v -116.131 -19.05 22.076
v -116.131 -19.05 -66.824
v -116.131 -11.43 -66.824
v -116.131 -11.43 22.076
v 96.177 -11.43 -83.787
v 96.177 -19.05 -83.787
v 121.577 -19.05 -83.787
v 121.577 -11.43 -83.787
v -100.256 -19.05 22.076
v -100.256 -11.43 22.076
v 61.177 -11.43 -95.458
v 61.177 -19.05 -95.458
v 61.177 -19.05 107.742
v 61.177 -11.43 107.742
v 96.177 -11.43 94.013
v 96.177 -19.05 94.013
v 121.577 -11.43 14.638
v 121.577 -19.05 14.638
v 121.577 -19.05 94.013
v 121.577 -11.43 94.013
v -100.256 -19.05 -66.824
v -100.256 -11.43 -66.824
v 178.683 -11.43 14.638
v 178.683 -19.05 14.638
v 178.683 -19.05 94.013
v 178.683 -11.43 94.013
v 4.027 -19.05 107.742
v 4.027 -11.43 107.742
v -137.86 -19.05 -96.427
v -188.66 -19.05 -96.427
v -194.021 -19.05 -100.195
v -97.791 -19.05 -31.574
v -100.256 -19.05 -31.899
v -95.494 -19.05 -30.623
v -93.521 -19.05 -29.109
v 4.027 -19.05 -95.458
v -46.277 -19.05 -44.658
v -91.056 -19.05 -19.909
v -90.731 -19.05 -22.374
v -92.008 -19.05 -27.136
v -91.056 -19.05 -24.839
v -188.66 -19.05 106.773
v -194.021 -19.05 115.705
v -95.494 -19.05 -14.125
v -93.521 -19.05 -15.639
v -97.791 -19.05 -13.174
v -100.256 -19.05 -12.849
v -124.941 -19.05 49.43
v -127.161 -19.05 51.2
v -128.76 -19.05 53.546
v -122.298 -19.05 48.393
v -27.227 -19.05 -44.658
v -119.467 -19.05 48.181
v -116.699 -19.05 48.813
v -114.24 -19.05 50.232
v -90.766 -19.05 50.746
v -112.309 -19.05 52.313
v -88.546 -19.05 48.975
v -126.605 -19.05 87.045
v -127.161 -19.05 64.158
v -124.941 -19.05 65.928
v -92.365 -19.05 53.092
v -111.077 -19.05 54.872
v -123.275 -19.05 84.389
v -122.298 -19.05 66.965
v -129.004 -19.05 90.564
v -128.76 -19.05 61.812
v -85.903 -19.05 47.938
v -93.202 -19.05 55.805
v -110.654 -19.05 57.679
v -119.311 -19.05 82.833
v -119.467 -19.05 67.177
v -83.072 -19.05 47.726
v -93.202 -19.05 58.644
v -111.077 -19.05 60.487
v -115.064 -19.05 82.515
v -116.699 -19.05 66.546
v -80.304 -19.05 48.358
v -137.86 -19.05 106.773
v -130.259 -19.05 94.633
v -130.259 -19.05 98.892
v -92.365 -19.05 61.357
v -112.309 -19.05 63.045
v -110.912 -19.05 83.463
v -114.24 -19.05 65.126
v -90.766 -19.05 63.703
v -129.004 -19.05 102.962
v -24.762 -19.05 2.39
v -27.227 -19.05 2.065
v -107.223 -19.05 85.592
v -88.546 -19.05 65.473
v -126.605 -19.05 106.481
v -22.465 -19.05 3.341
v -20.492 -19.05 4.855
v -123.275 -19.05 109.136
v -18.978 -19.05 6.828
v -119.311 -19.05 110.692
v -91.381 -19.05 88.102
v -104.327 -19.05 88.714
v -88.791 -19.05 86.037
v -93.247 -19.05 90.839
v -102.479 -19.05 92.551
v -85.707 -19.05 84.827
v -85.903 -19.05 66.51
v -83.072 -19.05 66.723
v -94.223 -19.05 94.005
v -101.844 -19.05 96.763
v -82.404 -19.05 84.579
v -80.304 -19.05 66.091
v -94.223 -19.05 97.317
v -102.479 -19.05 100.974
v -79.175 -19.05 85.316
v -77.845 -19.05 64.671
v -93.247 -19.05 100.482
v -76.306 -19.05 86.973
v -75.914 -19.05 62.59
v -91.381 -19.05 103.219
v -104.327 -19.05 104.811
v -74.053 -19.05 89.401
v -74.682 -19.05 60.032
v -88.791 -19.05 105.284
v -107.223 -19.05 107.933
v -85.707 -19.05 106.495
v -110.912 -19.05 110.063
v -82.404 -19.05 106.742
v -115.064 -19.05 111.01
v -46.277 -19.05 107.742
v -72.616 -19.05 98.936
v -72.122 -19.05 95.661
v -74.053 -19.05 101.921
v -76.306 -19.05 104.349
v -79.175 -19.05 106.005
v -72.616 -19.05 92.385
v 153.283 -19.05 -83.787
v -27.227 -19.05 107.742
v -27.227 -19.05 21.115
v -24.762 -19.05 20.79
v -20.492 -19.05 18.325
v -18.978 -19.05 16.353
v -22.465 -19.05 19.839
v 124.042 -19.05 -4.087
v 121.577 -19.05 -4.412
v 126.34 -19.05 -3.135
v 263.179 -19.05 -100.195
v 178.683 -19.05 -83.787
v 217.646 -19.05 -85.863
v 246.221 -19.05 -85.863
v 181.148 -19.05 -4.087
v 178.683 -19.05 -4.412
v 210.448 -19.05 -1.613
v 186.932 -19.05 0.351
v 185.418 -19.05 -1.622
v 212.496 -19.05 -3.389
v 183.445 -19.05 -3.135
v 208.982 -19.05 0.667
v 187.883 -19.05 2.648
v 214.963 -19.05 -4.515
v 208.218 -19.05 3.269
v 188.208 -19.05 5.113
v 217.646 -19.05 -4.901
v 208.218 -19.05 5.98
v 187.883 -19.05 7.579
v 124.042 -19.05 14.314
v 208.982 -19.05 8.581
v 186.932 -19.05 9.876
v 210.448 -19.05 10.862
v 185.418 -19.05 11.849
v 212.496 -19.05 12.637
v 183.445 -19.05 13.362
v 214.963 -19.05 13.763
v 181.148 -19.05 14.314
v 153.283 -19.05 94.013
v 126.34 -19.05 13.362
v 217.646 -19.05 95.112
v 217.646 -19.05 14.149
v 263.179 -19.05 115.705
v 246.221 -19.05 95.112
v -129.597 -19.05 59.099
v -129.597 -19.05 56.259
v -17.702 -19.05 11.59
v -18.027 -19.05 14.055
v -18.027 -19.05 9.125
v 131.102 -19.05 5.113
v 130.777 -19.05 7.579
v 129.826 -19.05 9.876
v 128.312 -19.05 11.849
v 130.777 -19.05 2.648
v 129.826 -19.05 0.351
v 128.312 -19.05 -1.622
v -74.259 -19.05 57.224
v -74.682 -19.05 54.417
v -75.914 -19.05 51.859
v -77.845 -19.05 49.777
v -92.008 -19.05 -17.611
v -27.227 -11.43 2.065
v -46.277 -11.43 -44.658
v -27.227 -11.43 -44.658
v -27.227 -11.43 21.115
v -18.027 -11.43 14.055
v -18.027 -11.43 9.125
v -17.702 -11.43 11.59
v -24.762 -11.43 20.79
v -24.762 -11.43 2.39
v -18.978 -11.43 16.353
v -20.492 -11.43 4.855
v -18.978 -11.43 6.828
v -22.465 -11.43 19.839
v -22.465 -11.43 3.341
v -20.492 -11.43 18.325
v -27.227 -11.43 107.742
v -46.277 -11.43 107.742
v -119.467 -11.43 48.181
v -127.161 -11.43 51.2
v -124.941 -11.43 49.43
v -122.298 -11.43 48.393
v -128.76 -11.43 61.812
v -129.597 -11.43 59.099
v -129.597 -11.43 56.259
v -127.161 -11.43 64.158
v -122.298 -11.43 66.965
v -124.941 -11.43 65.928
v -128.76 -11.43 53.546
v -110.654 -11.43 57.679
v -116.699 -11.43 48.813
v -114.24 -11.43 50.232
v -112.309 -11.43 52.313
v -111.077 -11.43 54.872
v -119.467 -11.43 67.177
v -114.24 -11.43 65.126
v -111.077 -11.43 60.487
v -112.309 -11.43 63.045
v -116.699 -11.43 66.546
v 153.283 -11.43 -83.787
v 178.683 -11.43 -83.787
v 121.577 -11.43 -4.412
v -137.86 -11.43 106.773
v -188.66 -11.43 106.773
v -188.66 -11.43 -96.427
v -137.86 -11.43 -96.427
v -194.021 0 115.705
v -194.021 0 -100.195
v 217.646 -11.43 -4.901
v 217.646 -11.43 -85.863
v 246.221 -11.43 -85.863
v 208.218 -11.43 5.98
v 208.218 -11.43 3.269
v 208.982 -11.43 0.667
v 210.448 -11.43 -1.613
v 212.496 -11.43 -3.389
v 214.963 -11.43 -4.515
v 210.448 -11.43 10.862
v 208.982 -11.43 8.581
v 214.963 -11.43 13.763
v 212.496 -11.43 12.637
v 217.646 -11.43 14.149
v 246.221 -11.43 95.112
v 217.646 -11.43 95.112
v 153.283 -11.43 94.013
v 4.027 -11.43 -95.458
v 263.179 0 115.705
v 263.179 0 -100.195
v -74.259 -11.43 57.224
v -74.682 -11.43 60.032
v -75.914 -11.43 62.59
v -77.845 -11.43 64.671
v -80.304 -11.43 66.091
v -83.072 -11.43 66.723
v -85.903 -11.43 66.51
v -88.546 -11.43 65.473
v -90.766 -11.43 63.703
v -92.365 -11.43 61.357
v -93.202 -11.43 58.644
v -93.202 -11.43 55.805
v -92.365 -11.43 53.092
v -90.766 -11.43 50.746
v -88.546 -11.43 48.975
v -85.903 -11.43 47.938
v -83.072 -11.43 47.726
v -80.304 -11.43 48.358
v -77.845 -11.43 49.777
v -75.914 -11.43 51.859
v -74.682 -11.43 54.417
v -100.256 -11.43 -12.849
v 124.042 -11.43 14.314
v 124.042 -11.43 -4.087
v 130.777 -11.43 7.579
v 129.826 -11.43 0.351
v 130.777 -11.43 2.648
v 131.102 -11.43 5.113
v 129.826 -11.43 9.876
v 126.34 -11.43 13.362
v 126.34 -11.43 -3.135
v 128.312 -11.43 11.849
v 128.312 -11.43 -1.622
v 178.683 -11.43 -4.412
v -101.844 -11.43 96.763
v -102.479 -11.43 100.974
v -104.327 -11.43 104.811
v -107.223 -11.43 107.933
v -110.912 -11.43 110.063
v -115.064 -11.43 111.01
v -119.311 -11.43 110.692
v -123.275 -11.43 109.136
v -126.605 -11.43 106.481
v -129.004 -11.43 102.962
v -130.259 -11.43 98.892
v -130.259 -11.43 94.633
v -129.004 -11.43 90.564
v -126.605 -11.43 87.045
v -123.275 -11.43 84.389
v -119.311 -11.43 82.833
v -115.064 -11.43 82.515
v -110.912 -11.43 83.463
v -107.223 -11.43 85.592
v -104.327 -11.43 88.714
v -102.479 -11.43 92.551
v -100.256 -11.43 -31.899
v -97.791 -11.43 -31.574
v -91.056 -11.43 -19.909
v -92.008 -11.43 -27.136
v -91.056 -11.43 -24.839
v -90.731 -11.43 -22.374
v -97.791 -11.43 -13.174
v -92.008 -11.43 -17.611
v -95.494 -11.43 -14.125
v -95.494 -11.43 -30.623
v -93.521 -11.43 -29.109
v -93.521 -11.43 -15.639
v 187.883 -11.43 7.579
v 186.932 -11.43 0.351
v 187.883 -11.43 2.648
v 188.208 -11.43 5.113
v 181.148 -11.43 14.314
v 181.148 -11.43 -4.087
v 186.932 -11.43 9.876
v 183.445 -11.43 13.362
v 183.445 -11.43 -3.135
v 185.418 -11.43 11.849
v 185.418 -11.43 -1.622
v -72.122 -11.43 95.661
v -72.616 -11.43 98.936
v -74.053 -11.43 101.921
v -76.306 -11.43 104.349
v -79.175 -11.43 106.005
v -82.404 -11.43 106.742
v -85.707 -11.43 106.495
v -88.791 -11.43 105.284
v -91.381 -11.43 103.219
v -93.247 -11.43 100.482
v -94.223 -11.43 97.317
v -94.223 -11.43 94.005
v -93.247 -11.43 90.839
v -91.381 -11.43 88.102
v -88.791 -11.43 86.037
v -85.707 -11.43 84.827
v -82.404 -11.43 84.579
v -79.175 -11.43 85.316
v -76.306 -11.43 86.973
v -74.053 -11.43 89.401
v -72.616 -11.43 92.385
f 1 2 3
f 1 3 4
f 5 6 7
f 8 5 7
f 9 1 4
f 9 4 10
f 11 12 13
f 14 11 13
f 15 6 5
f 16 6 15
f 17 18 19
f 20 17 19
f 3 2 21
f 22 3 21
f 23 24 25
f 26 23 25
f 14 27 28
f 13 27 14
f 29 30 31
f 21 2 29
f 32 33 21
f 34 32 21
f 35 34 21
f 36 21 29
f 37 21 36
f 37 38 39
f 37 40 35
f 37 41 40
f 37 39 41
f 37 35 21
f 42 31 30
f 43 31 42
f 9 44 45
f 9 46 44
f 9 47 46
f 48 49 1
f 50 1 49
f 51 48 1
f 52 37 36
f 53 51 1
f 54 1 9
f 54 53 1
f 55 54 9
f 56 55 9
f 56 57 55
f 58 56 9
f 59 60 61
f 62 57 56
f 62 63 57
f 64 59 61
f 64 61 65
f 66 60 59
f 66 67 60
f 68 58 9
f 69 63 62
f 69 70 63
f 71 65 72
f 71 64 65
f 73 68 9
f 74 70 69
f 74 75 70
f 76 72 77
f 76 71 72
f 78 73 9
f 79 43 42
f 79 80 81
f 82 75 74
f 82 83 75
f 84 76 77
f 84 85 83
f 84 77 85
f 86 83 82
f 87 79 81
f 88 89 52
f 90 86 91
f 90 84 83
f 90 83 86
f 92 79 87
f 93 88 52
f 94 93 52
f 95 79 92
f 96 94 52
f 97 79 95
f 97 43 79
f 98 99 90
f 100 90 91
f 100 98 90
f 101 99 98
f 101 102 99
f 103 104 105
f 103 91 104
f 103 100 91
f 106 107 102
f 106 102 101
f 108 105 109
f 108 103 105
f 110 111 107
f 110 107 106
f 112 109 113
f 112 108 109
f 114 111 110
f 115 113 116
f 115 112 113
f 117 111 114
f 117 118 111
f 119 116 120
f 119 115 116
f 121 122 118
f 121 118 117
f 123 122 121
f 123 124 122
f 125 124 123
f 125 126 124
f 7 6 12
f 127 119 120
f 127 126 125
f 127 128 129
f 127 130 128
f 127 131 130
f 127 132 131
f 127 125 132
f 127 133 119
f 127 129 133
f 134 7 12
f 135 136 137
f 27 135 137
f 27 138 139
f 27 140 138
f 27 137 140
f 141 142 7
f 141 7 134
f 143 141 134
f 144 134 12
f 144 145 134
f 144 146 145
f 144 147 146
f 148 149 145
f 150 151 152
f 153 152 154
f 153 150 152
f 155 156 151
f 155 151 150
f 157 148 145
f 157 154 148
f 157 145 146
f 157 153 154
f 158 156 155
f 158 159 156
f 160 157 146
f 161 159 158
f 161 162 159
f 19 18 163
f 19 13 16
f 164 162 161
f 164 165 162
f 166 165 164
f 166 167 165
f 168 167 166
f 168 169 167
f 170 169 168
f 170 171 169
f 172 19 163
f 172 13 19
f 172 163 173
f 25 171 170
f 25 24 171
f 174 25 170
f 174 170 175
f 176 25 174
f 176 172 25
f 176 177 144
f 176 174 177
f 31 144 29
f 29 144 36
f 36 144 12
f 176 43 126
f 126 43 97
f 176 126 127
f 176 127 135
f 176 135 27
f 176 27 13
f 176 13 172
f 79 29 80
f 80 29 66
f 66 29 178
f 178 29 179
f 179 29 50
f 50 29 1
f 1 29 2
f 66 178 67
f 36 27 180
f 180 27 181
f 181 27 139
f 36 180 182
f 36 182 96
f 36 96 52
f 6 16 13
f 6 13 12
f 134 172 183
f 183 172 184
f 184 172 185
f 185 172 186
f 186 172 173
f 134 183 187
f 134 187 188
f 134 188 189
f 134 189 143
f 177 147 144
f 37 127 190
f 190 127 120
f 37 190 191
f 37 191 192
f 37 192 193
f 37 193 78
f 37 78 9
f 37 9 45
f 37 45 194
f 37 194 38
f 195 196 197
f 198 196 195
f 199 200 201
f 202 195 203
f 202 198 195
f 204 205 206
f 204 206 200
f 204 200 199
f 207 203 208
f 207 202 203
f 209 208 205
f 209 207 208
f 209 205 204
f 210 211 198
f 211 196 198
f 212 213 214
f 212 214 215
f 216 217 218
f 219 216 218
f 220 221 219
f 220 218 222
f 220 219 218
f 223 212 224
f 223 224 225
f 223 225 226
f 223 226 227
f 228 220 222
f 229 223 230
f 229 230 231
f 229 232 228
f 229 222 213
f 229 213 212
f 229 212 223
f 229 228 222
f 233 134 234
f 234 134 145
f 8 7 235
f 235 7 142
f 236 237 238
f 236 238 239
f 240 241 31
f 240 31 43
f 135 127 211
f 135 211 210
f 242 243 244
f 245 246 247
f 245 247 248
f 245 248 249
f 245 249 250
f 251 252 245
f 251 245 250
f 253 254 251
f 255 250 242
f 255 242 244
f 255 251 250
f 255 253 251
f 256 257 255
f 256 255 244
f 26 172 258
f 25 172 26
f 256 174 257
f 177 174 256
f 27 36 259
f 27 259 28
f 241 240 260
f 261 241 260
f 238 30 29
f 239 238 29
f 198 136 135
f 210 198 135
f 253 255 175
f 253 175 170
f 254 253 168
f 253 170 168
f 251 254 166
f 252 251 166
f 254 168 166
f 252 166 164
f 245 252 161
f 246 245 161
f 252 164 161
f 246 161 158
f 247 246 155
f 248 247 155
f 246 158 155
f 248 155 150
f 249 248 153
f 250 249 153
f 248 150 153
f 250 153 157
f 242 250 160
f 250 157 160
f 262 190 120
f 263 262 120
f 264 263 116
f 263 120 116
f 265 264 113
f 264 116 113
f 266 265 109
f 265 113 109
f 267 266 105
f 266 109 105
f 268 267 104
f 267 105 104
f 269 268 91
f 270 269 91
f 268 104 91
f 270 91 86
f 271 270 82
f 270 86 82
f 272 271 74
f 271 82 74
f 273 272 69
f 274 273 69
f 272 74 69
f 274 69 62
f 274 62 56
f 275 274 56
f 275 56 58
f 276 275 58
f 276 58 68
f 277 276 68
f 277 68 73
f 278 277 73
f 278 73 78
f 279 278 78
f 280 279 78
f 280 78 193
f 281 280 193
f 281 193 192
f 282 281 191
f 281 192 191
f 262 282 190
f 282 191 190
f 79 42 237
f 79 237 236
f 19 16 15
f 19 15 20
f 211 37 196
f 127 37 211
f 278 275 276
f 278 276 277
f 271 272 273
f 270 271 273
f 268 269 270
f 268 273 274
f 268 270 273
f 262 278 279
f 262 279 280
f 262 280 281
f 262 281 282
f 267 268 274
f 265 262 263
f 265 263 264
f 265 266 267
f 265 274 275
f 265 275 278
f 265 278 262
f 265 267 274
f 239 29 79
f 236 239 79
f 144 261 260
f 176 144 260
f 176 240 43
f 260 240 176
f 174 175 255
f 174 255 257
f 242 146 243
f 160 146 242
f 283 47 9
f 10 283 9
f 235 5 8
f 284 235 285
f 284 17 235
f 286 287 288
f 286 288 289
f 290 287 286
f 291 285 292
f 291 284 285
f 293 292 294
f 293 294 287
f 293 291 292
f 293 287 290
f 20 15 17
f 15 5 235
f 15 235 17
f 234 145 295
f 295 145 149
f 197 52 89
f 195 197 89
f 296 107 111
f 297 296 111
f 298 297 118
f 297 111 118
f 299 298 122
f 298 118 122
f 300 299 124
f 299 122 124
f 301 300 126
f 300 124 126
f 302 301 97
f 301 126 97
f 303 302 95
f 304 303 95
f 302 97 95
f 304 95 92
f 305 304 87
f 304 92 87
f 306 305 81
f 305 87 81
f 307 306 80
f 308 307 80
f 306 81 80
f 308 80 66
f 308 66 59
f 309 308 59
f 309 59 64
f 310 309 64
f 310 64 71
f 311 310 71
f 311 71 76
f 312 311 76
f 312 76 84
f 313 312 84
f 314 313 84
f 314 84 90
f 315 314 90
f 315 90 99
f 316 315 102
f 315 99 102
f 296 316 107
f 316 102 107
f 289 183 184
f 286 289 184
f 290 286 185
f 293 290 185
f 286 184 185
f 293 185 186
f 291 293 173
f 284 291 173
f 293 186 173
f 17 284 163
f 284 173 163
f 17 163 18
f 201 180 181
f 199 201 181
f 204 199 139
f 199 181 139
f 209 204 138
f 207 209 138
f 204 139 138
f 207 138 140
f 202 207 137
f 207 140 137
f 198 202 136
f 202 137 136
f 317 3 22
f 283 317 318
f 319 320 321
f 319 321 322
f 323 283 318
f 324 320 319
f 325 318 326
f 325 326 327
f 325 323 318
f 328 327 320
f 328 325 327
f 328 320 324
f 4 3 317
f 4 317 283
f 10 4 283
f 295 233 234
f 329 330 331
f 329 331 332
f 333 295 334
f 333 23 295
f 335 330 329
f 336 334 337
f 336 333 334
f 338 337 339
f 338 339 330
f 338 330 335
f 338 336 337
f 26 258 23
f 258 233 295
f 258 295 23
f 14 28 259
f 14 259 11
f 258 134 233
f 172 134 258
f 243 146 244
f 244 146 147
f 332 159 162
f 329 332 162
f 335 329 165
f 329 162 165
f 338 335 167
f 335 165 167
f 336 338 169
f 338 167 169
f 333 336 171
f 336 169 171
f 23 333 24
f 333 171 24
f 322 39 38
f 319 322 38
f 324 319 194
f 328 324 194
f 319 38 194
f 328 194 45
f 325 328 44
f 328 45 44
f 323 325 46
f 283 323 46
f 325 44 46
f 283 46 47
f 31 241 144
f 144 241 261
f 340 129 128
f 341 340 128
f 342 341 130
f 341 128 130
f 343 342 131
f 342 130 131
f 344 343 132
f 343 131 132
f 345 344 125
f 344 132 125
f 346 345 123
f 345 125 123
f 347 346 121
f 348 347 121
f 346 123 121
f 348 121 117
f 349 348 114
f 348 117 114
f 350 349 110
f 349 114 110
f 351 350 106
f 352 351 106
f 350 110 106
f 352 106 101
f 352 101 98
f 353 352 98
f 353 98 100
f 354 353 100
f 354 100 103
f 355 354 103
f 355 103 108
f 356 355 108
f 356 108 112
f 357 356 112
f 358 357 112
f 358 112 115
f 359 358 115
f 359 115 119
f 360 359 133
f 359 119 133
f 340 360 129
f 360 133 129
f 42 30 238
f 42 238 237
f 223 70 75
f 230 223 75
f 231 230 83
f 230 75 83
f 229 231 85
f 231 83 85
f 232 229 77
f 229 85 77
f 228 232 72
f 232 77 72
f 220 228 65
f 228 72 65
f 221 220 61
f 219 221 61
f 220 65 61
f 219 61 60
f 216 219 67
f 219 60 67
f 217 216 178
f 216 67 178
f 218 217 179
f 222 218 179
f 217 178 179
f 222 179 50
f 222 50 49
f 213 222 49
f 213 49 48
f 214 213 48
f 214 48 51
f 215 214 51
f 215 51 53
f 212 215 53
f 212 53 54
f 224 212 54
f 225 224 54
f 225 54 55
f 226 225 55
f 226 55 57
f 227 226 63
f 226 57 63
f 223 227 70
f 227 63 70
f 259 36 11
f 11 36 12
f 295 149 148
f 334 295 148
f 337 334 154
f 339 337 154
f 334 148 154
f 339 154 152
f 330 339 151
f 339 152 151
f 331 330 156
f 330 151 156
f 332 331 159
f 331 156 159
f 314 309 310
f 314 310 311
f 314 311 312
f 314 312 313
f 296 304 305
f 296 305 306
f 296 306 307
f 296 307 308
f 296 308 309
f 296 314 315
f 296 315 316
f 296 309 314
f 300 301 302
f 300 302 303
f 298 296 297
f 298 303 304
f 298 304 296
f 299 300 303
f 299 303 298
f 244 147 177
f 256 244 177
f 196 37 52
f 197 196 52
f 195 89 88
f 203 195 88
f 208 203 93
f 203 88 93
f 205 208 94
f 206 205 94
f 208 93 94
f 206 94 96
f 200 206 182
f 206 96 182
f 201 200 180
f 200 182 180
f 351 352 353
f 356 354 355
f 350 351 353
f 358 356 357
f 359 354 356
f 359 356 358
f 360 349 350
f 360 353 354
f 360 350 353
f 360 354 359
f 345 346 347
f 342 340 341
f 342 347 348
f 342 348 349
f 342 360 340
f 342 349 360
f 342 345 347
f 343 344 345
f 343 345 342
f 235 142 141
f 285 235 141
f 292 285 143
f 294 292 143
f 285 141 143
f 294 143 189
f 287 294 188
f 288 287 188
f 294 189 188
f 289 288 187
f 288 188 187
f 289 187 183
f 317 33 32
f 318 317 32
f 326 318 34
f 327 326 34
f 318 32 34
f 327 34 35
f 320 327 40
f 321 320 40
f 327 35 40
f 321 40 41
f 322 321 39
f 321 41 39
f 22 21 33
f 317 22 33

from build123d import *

# Parameters (mm, degrees)
F0_W     = 457.2
F0_H     = 215.9
F1_DEPTH = 19.05
F2_W     = 50.8
F2_H     = 203.2
F2_W_2   = 15.875
F2_H_2   = 88.9
F2_W_3   = 19.05
F2_H_3   = 152.4
F2_W_4   = 57.15
F2_W_5   = 25.4
F2_H_4   = 177.8
F2_W_6   = 28.575
F2_H_5   = 180.975
F2_R     = 14.2875
F2_R_2   = 11.1125
F2_R_3   = 9.525
F3_DEPTH = 7.62
F5_DEPTH = 7.62


# Not quite as in the source:
# - a length typed as a fraction of an inch, garbled in the dataset ("3 / 203.2 mm" for 3/8 in), is restored


with BuildPart() as f1:
    # F0 (on Front) → F1 (new body)
    with BuildSketch(Plane.XZ):
        with Locations((34.5792232292, 7.7549852431)):
            Rectangle(F0_W, F0_H)
    extrude(amount=F1_DEPTH)

    # F2 (on face) → F3 (cut)
    with BuildSketch(Plane.XZ.offset(19.05)):
        with Locations((-163.2603832245, 5.173290801)):
            Rectangle(F2_W, F2_H)
        with Locations((-108.1939504743, -22.3739650816)):
            Rectangle(F2_W_2, F2_H_2)
        with Locations((-36.7521092981, 31.5419817448)):
            Rectangle(F2_W_3, F2_H_3)
        with Locations((32.6018253148, 6.1419817448)):
            Rectangle(F2_W_4, F2_H)
        with Locations((108.8770244598, 5.1134674311)):
            Rectangle(F2_W_5, F2_H_4)
        with Locations((165.9826848984, 5.1134674311)):
            Rectangle(F2_W_5, F2_H_4)
        with Locations((231.9335953236, 4.6242426157)):
            Rectangle(F2_W_6, F2_H_5)
        with Locations((-116.1314504743, 96.762670864)):
            Circle(F2_R)
        with Locations((-83.2345709205, 95.660790801)):
            Circle(F2_R_2)
        with Locations((-83.7836638093, 57.2242997587)):
            Circle(F2_R_3)
        with Locations((-120.1787297428, 57.6790883665)):
            Circle(F2_R_3)
    extrude(amount=-F3_DEPTH, mode=Mode.SUBTRACT)

    # F4 (on face) → F5 (cut)
    with BuildSketch(Plane.XZ.offset(19.05)):
        with BuildLine():
            ThreePointArc((-100.2564504743, -31.8989650816), (-93.5212583835, -29.1091571724), (-90.7314504743, -22.3739650816))
            ThreePointArc((-90.7314504743, -22.3739650816), (-93.5212583835, -15.6387729908), (-100.2564504743, -12.8489650816))
            Line((-100.2564504743, -12.8489650816), (-100.2564504743, -31.8989650816))
        make_face()
        with BuildLine():
            ThreePointArc((-27.2271092981, 2.0650514647), (-20.4919172073, 4.8548593739), (-17.7021092981, 11.5900514647))
            ThreePointArc((-17.7021092981, 11.5900514647), (-20.4919172073, 18.3252435555), (-27.2271092981, 21.1150514647))
            Line((-27.2271092981, 21.1150514647), (-27.2271092981, 2.0650514647))
        make_face()
        with BuildLine():
            ThreePointArc((121.5770244598, -4.4115325689), (128.3122165506, -1.6217246597), (131.1020244598, 5.1134674311))
            ThreePointArc((131.1020244598, 5.1134674311), (128.3122165506, 11.8486595219), (121.5770244598, 14.6384674311))
            Line((121.5770244598, 14.6384674311), (121.5770244598, -4.4115325689))
        make_face()
        with BuildLine():
            ThreePointArc((178.6826848984, -4.4115325689), (185.4178769892, -1.6217246597), (188.2076848984, 5.1134674311))
            ThreePointArc((188.2076848984, 5.1134674311), (185.4178769892, 11.8486595219), (178.6826848984, 14.6384674311))
            Line((178.6826848984, 14.6384674311), (178.6826848984, -4.4115325689))
        make_face()
        with BuildLine():
            ThreePointArc((217.6460953236, -4.9007573843), (224.3812874144, -2.1109494751), (227.1710953236, 4.6242426157))
            ThreePointArc((227.1710953236, 4.6242426157), (224.3812874144, 11.3594347065), (217.6460953236, 14.1492426157))
            Line((217.6460953236, 14.1492426157), (217.6460953236, -4.9007573843))
        make_face()
        with BuildLine():
            Line((217.6460953236, -4.9007573843), (217.6460953236, 14.1492426157))
            ThreePointArc((217.6460953236, 14.1492426157), (208.1210953236, 4.6242426157), (217.6460953236, -4.9007573843))
        make_face()
    extrude(amount=-F5_DEPTH, mode=Mode.SUBTRACT)


solid = f1.part
